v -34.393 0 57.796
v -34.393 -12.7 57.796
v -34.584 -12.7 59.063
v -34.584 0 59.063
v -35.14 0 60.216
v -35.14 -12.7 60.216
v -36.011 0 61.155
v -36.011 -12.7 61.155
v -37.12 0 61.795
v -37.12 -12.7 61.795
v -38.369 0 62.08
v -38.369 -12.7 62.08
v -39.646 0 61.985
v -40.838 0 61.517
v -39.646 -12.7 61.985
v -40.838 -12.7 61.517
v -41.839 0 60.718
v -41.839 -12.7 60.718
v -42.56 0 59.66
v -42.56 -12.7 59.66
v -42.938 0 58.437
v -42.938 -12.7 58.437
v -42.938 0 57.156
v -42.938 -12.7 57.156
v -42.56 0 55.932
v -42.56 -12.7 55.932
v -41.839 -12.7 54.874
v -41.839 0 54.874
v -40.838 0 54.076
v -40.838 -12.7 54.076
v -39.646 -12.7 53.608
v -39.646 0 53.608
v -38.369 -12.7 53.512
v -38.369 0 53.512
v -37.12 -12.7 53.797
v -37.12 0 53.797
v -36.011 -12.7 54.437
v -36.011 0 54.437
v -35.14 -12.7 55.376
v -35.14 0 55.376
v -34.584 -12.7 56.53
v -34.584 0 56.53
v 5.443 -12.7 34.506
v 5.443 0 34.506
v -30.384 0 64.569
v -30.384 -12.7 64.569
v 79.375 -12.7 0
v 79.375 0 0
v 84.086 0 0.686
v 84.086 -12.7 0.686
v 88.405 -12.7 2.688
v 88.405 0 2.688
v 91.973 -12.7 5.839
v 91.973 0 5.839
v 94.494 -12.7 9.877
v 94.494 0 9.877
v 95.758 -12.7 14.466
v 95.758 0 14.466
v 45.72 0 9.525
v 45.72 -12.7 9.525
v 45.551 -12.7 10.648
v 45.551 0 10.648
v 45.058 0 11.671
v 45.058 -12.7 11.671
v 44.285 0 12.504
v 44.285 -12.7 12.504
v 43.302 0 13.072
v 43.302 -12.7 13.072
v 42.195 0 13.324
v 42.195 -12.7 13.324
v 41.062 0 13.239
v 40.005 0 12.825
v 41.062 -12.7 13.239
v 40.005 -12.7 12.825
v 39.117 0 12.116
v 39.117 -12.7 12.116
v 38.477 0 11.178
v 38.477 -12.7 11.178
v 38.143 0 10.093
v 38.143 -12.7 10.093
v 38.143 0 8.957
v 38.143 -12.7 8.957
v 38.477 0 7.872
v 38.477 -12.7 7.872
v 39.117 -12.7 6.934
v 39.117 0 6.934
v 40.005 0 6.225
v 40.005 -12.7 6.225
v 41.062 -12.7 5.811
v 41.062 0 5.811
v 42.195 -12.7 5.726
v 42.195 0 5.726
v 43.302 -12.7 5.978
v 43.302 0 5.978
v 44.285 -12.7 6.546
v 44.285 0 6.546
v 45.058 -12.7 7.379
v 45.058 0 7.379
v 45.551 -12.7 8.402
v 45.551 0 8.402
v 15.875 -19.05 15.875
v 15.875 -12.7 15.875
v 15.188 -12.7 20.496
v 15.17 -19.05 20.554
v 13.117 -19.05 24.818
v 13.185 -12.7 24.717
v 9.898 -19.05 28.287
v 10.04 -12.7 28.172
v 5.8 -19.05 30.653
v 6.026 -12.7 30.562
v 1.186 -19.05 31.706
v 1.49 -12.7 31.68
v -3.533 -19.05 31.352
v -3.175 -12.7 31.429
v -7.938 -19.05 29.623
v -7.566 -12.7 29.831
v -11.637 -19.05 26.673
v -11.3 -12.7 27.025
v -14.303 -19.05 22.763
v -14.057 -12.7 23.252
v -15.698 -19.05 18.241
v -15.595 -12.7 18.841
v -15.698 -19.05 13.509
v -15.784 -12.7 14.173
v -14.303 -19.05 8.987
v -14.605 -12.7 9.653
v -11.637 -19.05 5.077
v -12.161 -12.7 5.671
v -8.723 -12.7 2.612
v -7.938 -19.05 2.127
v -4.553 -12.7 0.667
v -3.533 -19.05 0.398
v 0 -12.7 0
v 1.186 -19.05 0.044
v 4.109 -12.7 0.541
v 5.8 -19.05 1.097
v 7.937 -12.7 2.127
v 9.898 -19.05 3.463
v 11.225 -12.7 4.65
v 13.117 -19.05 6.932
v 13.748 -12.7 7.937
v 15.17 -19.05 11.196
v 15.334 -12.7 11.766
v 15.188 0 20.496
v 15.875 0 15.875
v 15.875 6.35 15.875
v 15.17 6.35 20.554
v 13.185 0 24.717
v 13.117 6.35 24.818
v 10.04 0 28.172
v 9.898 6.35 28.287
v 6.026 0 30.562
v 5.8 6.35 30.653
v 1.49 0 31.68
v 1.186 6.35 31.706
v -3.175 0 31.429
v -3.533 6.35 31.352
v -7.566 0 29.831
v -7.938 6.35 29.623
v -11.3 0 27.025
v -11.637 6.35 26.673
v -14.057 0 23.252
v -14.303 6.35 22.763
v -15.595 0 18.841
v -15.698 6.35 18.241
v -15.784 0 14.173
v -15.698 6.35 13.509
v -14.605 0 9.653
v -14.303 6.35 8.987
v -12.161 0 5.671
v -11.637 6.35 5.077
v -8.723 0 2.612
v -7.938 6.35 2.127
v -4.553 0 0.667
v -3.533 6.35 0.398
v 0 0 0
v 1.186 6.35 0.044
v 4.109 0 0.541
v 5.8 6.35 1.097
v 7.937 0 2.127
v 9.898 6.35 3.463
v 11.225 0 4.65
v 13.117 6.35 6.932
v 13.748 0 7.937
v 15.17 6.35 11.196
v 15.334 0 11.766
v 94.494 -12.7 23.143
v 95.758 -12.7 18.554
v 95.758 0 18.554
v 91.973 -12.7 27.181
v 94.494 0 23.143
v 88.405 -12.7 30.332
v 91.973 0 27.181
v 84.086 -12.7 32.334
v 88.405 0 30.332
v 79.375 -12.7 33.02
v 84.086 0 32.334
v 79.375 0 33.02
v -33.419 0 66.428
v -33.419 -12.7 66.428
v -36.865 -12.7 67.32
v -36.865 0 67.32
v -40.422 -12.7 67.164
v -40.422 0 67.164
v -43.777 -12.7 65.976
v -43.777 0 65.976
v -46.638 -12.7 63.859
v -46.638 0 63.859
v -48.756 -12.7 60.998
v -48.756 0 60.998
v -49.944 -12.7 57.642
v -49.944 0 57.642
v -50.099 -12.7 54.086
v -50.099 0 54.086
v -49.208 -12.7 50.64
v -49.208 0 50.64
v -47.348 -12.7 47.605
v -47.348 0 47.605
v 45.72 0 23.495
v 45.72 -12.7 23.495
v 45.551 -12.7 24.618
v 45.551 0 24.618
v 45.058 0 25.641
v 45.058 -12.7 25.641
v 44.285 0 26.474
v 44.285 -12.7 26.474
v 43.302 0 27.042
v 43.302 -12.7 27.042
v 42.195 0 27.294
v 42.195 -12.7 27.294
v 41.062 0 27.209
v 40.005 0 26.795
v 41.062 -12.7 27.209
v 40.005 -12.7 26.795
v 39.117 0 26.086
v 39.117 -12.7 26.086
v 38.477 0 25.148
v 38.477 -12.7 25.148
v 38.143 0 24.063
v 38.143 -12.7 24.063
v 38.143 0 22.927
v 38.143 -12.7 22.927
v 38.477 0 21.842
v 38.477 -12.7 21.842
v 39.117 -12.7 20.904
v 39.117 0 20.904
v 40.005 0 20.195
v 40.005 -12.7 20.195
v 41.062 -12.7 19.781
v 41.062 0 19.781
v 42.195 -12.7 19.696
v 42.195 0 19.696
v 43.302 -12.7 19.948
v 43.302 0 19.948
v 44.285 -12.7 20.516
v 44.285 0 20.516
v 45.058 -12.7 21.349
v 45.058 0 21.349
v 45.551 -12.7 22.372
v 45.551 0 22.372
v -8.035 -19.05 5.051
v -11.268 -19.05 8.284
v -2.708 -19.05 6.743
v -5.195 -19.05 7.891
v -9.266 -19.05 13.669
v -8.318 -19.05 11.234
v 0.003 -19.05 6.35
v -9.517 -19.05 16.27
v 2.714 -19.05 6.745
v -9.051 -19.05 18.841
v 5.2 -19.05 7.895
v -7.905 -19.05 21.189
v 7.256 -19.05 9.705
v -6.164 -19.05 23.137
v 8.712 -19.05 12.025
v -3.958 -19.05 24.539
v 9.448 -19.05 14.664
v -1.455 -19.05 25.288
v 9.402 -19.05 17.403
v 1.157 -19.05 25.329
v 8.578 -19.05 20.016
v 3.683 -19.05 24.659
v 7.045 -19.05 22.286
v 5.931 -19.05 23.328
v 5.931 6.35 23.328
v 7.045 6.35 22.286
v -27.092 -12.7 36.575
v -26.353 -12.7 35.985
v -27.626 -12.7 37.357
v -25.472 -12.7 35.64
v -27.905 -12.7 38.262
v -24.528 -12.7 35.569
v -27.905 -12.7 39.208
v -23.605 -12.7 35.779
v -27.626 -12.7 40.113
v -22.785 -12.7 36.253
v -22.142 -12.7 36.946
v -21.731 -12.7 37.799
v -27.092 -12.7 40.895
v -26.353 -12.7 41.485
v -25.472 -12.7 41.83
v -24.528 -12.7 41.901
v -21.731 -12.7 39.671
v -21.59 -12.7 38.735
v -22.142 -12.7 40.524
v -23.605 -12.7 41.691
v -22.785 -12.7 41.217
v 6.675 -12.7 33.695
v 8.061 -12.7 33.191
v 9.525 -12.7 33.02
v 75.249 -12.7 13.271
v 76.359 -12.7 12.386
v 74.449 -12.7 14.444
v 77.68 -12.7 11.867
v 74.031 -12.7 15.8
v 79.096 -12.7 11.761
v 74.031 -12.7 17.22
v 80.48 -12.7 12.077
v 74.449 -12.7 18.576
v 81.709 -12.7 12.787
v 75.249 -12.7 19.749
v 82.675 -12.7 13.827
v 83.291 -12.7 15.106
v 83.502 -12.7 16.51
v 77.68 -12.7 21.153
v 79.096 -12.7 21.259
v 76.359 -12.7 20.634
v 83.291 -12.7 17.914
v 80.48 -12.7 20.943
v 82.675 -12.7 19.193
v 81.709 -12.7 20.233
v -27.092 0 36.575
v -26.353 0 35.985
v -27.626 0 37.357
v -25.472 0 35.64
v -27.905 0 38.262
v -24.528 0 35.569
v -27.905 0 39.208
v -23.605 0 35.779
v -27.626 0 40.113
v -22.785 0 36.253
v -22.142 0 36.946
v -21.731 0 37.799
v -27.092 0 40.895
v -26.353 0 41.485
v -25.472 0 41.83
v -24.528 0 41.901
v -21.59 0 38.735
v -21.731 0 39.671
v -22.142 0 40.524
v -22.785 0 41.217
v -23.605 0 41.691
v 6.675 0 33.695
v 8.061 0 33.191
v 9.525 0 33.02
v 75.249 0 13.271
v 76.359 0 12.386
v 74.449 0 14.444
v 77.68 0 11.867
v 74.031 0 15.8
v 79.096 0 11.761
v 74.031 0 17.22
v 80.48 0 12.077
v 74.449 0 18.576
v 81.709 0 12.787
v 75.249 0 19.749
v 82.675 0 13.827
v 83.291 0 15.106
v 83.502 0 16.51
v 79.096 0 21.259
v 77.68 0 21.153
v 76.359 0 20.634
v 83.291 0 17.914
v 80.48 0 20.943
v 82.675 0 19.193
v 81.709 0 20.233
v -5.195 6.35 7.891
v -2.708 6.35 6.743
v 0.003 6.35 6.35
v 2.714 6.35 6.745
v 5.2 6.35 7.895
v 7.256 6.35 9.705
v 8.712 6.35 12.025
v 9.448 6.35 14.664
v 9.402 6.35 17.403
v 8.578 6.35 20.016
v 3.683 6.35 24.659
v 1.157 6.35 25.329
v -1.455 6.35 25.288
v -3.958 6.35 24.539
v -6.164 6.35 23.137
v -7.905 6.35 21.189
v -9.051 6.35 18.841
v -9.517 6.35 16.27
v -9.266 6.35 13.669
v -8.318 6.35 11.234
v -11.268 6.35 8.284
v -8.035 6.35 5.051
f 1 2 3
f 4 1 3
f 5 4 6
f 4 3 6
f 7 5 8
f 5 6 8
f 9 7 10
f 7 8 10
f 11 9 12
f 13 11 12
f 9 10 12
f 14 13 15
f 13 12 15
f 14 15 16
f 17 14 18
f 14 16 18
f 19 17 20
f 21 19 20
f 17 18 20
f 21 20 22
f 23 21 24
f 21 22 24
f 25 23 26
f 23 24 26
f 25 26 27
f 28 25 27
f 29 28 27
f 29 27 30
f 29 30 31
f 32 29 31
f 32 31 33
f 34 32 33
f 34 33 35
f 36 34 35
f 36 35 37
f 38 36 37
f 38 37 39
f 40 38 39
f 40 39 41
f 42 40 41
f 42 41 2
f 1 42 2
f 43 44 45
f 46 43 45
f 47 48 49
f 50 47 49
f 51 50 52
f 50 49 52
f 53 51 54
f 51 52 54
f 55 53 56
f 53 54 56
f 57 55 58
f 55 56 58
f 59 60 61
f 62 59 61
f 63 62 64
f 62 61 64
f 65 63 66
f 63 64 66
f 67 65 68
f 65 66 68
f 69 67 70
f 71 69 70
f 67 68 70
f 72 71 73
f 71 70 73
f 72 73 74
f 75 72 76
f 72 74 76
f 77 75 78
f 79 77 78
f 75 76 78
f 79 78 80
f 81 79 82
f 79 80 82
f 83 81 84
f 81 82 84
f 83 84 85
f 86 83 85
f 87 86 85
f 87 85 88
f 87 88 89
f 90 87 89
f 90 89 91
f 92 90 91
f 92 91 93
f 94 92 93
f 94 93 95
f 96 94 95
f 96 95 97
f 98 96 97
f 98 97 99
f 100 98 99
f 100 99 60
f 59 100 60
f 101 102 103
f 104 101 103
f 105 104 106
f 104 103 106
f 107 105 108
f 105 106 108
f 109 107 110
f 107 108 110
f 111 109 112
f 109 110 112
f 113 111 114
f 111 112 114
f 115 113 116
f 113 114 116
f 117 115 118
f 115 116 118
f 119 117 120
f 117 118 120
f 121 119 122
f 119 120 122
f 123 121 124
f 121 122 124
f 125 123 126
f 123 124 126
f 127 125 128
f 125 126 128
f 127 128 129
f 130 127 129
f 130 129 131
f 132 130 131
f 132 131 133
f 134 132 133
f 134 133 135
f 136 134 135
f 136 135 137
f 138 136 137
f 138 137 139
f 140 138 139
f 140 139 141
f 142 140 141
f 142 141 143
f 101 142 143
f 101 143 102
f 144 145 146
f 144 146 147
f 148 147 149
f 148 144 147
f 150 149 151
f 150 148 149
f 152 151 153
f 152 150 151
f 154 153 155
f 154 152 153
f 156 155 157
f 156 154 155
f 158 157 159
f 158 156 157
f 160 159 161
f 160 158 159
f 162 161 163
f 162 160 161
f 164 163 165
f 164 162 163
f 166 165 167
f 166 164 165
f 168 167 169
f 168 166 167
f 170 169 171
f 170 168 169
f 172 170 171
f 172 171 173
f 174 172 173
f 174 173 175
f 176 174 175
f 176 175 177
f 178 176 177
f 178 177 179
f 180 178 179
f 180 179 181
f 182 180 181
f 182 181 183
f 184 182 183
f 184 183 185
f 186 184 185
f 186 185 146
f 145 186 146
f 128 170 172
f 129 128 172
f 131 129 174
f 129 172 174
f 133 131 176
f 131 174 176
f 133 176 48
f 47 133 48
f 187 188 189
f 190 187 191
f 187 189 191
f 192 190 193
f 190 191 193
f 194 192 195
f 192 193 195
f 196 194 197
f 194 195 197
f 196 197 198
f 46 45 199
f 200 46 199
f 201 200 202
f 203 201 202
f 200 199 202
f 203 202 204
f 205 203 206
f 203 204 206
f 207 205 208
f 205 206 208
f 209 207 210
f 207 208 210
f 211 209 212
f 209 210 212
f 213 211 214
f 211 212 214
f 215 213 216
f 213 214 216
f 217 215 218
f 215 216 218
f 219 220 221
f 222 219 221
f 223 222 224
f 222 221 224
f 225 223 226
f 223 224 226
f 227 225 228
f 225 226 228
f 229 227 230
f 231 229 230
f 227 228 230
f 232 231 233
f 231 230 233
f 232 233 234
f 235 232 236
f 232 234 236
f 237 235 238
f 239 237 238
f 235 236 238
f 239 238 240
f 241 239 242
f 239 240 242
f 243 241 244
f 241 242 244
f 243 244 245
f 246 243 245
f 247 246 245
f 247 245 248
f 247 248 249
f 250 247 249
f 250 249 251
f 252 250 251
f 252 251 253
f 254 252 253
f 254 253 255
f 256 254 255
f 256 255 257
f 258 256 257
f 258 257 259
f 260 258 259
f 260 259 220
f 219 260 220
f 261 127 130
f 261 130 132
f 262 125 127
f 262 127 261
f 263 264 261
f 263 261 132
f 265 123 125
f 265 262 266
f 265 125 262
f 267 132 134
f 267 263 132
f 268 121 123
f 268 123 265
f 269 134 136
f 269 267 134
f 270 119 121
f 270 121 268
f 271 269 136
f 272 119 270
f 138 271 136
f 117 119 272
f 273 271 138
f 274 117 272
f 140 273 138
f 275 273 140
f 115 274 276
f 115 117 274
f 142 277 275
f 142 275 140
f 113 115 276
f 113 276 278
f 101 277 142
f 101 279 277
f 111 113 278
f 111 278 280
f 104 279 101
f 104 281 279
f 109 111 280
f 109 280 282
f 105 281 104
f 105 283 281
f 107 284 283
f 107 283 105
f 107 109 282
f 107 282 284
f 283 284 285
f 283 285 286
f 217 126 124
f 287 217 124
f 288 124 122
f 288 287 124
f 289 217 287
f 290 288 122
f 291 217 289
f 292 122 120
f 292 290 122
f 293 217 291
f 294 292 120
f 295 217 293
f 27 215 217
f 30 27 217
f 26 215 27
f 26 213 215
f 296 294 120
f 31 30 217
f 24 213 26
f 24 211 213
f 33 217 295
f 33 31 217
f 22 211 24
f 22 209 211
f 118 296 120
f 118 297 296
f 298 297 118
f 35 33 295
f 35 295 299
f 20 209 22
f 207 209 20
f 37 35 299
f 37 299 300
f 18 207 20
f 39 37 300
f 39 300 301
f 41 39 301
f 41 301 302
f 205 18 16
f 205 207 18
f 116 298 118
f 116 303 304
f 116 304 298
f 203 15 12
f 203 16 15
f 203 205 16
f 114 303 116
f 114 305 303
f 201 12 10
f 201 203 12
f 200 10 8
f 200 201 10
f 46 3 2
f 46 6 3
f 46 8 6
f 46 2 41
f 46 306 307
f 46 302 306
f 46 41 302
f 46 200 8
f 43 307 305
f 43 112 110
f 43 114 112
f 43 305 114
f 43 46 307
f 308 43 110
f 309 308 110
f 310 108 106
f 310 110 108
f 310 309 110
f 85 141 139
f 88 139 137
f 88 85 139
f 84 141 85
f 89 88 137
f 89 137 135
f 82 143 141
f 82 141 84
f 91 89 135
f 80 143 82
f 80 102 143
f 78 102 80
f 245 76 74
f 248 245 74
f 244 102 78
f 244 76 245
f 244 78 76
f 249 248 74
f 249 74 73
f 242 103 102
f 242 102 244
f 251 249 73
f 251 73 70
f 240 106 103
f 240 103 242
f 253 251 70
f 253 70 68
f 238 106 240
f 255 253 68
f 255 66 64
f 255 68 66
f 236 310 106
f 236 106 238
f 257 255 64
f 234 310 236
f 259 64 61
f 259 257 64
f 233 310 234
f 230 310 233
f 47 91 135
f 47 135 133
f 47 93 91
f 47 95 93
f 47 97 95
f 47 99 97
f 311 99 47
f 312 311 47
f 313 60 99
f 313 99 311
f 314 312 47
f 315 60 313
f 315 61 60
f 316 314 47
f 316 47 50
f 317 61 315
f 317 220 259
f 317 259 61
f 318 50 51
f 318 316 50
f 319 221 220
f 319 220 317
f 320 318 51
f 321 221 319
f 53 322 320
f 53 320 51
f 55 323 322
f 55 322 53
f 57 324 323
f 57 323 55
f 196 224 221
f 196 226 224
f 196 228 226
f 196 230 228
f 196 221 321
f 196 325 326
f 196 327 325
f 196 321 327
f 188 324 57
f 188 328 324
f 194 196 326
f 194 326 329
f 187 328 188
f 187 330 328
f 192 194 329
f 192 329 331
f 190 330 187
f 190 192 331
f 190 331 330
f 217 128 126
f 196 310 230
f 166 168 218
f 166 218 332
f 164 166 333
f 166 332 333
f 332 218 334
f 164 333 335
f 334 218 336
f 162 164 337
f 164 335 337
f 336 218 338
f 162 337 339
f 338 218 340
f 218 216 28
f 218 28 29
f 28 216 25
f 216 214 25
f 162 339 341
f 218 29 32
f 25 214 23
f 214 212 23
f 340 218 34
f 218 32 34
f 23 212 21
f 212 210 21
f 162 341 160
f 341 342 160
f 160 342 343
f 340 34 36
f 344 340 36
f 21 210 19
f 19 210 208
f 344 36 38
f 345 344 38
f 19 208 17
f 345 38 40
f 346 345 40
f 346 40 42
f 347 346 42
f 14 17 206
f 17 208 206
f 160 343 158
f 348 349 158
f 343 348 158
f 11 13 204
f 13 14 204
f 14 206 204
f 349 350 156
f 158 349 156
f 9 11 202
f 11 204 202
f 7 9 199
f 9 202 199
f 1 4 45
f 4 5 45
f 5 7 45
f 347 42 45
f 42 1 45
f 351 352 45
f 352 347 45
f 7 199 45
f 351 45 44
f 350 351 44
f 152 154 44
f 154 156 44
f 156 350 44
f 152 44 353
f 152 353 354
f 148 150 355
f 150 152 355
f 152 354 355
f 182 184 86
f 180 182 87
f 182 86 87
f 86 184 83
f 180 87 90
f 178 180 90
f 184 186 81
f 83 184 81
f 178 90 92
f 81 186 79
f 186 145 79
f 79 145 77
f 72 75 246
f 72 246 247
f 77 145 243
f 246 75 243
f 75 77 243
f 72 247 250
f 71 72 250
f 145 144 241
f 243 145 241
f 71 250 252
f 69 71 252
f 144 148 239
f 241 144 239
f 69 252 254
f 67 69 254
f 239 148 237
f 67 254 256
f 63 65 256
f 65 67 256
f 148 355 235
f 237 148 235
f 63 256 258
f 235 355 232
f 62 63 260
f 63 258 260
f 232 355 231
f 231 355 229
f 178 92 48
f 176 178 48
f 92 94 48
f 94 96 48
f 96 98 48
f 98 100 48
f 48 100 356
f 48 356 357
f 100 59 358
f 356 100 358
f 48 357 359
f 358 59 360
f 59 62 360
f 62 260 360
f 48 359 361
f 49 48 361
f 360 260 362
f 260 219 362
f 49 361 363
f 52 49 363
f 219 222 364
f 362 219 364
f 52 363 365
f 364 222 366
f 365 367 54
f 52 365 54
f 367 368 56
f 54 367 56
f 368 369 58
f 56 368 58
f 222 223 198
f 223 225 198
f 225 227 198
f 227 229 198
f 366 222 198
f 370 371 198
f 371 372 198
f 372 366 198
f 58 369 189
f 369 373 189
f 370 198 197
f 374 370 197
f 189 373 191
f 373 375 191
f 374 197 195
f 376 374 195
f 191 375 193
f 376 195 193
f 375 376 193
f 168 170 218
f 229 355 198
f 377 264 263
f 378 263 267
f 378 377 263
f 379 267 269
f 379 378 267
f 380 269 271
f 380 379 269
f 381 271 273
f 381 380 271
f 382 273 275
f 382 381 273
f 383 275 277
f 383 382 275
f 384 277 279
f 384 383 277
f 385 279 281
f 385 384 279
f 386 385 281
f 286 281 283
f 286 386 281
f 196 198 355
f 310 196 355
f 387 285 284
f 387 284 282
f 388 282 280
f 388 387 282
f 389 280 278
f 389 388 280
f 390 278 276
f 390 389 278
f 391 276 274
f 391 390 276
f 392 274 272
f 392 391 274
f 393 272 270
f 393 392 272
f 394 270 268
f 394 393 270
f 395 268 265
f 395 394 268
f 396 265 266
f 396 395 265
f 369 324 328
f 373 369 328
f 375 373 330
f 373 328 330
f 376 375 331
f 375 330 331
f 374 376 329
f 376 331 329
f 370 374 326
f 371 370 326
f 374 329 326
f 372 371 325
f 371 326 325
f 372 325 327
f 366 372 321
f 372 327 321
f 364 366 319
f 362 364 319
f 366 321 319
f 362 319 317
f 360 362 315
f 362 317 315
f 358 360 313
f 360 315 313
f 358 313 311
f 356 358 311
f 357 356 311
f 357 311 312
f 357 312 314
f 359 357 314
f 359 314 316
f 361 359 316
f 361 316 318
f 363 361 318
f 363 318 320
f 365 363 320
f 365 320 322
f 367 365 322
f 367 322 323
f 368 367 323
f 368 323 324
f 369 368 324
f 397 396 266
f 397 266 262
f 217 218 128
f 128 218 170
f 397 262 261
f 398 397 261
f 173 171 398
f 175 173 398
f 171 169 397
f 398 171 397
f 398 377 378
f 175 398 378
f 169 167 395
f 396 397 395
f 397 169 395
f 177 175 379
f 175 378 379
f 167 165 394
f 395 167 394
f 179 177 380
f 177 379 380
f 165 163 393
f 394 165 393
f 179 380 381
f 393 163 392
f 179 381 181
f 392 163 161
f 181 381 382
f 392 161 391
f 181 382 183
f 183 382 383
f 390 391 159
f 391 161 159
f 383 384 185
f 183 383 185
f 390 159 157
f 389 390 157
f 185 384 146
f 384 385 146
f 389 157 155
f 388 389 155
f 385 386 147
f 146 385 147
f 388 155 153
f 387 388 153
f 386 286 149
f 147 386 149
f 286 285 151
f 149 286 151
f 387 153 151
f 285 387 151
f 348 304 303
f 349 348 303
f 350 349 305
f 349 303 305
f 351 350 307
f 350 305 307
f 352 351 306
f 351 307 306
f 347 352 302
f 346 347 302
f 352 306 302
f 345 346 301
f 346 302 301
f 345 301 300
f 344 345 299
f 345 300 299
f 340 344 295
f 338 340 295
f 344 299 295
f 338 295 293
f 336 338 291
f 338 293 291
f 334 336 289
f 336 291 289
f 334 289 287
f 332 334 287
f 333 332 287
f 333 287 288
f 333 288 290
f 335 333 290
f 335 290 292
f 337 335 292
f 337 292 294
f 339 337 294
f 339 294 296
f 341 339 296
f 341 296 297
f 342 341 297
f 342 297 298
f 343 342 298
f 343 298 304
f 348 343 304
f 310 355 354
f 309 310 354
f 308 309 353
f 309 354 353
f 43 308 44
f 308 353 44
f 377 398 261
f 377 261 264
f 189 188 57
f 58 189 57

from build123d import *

# Parameters (mm, degrees)
F1_DEPTH      = 12.7
F2_R          = 15.875
F2_R_2        = 9.525
F3_DEPTH      = 6.35
F3_DEPTH_BACK = 19.05
F4_R          = 9.525
F5_DEPTH      = 25.4
F7_DEPTH      = 25.401
F8_R          = 4.7625
F8_R_2        = 3.81
F8_R_3        = 3.175
F8_R_4        = 4.2961277226
F9_DEPTH      = 19.051
F12_DEPTH     = 19.051
F14_DEPTH     = 25.4


# Not quite as in the source:
# - after a boolean that leaves OpenCascade's solid faulty, fix() repairs it


with BuildPart() as f1:
    # F0 (on Front) → F1 (new body)
    with BuildSketch(Plane.XZ):
        with BuildLine():
            ThreePointArc((-12.1609555345, 5.6707466962), (-6.7090649051, 1.4873638808), (0, 0))
            Line((0, 0), (79.375, 0))
            ThreePointArc((79.375, 0), (95.885, 16.51), (79.375, 33.02))
            Line((79.375, 33.02), (9.525, 33.02))
            ThreePointArc((9.525, 33.02), (7.3531720899, 33.402951858), (5.4432986785, 34.5056177862))
            Line((5.4432986785, 34.5056177862), (-30.3843620081, 64.5685946542))
            ThreePointArc((-30.3843620081, 64.5685946542), (-46.6383026366, 63.8589322804), (-47.3479650105, 47.6049916518))
            Line((-47.3479650105, 47.6049916518), (-12.1609555345, 5.6707466962))
        make_face()
    extrude(amount=F1_DEPTH)

    # F2 (on face) → F3 (join, two sides)
    with BuildSketch(Plane.XZ.offset(12.7)) as f3_sk:
        with Locations((0, 15.875)):
            Circle(F2_R)
        with Locations((0, 15.875)):
            Circle(F2_R_2, mode=Mode.SUBTRACT)
    extrude(amount=F3_DEPTH)
    extrude(f3_sk.sketch, amount=-F3_DEPTH_BACK)

    add(f1.part.fix(), mode=Mode.REPLACE)

    # F4 (on face) → F5 (cut)
    with BuildSketch(Plane.XZ.offset(12.7)):
        with Locations((0, 15.875)):
            Circle(F4_R)
    extrude(amount=-F5_DEPTH, mode=Mode.SUBTRACT)

    # F6 (on face) → F7 (cut, through all)
    with BuildSketch(Plane.XZ.offset(19.05)):
        with BuildLine():
            Line((-8.3178005381, 11.2338989228), (-11.2676186575, 8.2840808033))
            Line((-11.2676186575, 8.2840808033), (-8.034726454, 5.0511885997))
            Line((-8.034726454, 5.0511885997), (-5.1946960102, 7.8912190435))
            ThreePointArc((-5.1946960102, 7.8912190435), (-6.959904305, 9.3722807946), (-8.3178005381, 11.2338989228))
        make_face()
    extrude(amount=-F7_DEPTH, mode=Mode.SUBTRACT)

    # F8 (on face) → F9 (cut, through all)
    with BuildSketch(Plane.XZ.offset(12.7)):
        with Locations((78.74, 16.51)):
            Circle(F8_R)
        with Locations((41.91, 23.495)):
            Circle(F8_R_2)
        with Locations((41.91, 9.525)):
            Circle(F8_R_2)
        with Locations((-24.765, 38.735)):
            Circle(F8_R_3)
        with Locations((-38.6896171983, 57.7962485902)):
            Circle(F8_R_4)
    extrude(amount=-F9_DEPTH, mode=Mode.SUBTRACT)

    # F11 (on face) → F12 (cut, through all)
    with BuildSketch(Plane.XZ.offset(12.7)):
        with BuildLine():
            Line((95.758, 18.5538715713), (95.758, 14.4661284287))
            ThreePointArc((95.758, 14.4661284287), (95.885, 16.51), (95.758, 18.5538715713))
        make_face()
        with BuildLine():
            ThreePointArc((95.758, 18.5538715713), (95.885, 16.51), (95.758, 14.4661284287))
            Line((95.758, 14.4661284287), (95.758, 13.97))
            Line((95.758, 13.97), (97.3146509769, 13.97))
            Line((97.3146509769, 13.97), (97.3146509769, 19.05))
            Line((97.3146509769, 19.05), (95.758, 19.05))
            Line((95.758, 19.05), (95.758, 18.5538715713))
        make_face()
    extrude(amount=-F12_DEPTH, mode=Mode.SUBTRACT)

    # F13 (on face) → F14 (join)
    with BuildSketch(Plane.XZ.offset(19.05)):
        with BuildLine():
            Line((5.9313747803, 23.3278127721), (7.0446438565, 22.2858203792))
            ThreePointArc((7.0446438565, 22.2858203792), (6.5088940652, 22.8291299274), (5.9313747803, 23.3278127721))
        make_face()
    extrude(amount=-F14_DEPTH)


solid = f1.part
